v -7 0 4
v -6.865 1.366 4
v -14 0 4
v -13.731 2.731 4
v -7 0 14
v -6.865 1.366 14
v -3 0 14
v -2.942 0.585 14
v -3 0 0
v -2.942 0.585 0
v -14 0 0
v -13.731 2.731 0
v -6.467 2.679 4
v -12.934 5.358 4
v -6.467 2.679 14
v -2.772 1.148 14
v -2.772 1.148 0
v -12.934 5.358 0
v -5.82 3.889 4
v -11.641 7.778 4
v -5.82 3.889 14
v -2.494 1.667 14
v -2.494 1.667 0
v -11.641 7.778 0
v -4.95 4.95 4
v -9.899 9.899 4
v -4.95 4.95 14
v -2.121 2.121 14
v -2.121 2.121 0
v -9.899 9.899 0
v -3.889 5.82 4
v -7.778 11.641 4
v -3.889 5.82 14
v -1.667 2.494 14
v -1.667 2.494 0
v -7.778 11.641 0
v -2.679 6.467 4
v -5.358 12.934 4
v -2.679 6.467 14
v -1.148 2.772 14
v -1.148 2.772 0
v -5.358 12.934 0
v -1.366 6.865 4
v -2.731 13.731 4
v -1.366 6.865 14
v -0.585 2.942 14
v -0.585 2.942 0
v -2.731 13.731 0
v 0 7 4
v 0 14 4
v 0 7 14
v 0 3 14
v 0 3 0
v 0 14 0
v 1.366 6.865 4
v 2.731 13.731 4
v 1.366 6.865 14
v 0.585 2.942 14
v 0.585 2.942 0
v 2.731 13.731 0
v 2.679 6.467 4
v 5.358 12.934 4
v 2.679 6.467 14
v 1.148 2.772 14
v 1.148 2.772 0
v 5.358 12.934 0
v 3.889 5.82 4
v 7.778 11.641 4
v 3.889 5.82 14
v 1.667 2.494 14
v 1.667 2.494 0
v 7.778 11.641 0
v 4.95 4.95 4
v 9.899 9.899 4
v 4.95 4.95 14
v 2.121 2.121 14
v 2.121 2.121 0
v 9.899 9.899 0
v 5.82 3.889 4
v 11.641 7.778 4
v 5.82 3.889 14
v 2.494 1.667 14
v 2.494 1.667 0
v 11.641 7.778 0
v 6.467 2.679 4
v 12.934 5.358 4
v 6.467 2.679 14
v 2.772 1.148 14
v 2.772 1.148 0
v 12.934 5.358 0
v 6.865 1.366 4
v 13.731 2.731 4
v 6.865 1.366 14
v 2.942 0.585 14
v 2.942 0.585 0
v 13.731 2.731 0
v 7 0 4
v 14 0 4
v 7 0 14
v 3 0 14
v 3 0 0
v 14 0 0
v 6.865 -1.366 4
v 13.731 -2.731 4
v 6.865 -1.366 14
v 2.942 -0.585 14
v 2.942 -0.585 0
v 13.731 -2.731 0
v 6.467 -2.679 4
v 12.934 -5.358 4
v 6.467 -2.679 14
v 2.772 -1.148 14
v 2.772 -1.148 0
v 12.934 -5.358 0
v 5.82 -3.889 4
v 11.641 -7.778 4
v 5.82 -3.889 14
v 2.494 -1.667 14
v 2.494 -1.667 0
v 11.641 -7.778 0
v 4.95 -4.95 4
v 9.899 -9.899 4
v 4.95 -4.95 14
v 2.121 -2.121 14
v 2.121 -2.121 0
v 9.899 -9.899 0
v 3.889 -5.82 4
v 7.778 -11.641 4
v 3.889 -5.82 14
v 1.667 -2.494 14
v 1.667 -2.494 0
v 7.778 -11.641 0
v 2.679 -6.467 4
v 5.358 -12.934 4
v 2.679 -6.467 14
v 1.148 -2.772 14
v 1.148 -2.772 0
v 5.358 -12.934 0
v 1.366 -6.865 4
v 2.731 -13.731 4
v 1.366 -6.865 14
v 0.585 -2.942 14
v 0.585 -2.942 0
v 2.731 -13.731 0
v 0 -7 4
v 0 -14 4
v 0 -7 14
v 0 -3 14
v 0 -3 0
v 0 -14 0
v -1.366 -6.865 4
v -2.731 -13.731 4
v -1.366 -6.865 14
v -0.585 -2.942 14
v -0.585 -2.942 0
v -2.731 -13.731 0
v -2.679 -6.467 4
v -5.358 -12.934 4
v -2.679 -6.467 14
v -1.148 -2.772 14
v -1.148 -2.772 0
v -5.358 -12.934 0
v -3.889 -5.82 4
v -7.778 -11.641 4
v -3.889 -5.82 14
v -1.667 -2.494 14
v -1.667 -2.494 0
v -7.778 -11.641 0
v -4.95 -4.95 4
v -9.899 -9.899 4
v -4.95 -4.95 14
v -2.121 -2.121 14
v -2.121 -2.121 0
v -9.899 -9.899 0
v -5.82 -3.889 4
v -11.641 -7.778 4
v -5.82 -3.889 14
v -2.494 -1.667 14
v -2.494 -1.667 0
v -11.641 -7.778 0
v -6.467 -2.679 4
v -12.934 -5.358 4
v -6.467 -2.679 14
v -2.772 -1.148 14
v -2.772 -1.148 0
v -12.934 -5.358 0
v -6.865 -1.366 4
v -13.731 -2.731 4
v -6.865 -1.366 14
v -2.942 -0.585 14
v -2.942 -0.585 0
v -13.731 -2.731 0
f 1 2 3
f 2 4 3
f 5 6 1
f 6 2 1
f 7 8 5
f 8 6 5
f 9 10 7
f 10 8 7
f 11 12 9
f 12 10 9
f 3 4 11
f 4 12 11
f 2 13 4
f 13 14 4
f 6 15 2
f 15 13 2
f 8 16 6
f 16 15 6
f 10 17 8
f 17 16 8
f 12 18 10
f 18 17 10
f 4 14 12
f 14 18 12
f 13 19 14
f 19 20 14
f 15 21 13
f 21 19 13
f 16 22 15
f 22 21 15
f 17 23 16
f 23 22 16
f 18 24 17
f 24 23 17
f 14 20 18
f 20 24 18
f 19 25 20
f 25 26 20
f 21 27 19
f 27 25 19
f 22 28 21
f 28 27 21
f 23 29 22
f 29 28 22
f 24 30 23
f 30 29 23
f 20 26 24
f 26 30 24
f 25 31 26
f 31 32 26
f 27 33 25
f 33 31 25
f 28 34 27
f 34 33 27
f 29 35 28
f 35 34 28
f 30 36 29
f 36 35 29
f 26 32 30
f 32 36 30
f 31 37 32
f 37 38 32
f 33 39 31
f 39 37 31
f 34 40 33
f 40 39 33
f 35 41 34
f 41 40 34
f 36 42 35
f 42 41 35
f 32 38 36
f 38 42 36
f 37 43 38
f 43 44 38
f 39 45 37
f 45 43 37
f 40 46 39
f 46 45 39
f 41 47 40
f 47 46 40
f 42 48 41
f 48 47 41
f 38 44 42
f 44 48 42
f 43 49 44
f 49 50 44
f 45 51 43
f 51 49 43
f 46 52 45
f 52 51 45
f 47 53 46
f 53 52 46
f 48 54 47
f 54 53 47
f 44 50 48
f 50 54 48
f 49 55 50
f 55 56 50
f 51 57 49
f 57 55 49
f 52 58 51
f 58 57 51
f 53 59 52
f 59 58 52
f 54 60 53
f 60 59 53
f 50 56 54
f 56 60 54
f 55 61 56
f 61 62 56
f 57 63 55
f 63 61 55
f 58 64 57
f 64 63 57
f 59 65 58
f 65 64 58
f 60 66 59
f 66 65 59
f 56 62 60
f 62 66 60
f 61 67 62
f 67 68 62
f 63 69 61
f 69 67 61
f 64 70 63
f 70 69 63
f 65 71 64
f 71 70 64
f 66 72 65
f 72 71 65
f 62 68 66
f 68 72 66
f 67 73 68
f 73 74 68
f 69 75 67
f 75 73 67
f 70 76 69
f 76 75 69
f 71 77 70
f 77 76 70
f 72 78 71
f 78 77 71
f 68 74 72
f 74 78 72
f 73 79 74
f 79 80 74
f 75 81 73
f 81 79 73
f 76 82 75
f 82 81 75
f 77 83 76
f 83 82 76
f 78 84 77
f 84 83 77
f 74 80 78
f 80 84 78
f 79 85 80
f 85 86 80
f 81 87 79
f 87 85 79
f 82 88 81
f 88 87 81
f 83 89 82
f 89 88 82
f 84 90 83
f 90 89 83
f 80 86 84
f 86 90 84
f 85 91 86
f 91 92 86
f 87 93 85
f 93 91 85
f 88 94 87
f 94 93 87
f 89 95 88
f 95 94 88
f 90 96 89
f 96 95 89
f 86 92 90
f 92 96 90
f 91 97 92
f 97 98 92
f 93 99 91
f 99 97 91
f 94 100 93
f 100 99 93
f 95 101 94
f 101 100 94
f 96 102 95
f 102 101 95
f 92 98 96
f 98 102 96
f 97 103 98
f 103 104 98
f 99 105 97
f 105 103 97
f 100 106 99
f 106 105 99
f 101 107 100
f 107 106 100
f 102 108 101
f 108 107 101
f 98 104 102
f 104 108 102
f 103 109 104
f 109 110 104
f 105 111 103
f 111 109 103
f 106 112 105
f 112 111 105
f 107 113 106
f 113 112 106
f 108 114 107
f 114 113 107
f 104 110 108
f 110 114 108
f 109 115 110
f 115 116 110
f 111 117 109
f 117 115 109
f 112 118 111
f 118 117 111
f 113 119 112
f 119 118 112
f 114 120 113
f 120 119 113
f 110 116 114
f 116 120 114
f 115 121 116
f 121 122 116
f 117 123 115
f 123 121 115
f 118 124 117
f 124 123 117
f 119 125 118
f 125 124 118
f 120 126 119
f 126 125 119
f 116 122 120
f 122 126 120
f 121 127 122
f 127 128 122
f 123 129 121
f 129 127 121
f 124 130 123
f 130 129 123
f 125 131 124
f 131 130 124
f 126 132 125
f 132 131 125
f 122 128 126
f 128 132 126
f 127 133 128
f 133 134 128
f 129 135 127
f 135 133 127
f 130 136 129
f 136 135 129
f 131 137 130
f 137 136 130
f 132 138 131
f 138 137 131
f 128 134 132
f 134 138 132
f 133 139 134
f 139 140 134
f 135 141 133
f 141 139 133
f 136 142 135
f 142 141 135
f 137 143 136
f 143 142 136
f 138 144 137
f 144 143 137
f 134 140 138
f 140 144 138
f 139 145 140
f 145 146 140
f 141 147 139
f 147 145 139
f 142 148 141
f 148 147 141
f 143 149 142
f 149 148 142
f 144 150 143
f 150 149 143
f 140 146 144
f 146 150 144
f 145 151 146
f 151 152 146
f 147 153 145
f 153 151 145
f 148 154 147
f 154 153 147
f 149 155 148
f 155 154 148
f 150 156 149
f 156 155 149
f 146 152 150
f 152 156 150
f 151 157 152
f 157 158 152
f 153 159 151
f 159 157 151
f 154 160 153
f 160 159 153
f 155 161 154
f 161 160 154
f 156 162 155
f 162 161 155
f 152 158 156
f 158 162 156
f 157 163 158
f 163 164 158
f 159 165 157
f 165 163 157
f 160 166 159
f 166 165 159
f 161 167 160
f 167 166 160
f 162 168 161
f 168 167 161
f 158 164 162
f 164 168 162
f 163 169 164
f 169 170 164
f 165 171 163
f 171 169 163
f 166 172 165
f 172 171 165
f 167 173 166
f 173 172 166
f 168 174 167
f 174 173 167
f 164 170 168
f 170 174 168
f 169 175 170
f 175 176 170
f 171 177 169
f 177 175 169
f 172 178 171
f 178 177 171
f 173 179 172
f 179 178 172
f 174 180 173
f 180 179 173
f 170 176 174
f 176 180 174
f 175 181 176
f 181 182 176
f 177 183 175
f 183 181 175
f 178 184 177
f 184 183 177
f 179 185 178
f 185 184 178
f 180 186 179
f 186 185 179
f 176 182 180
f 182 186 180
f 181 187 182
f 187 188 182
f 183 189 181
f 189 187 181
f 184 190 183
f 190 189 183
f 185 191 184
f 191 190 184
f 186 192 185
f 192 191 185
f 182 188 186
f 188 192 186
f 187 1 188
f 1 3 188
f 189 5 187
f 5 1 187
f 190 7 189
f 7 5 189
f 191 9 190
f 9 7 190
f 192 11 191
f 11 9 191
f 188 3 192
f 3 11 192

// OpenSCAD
$fn = 32;

// ----------------------------------------------------------------------
// Arc stop: collar, 14 mm thick
// ----------------------------------------------------------------------

// --- parameters (mm) ---
revolve_angle = 360;      // full turn around the Z axis
profile_points = 6;       // points of the closed outline

profile = [[3, 0], [14, 0], [14, 4], [7, 4], [7, 14], [3, 14]];  // single closed polygon, 6 points, counter clockwise

// --- the one profile operation ---
rotate_extrude(angle = revolve_angle) polygon(points = profile);
